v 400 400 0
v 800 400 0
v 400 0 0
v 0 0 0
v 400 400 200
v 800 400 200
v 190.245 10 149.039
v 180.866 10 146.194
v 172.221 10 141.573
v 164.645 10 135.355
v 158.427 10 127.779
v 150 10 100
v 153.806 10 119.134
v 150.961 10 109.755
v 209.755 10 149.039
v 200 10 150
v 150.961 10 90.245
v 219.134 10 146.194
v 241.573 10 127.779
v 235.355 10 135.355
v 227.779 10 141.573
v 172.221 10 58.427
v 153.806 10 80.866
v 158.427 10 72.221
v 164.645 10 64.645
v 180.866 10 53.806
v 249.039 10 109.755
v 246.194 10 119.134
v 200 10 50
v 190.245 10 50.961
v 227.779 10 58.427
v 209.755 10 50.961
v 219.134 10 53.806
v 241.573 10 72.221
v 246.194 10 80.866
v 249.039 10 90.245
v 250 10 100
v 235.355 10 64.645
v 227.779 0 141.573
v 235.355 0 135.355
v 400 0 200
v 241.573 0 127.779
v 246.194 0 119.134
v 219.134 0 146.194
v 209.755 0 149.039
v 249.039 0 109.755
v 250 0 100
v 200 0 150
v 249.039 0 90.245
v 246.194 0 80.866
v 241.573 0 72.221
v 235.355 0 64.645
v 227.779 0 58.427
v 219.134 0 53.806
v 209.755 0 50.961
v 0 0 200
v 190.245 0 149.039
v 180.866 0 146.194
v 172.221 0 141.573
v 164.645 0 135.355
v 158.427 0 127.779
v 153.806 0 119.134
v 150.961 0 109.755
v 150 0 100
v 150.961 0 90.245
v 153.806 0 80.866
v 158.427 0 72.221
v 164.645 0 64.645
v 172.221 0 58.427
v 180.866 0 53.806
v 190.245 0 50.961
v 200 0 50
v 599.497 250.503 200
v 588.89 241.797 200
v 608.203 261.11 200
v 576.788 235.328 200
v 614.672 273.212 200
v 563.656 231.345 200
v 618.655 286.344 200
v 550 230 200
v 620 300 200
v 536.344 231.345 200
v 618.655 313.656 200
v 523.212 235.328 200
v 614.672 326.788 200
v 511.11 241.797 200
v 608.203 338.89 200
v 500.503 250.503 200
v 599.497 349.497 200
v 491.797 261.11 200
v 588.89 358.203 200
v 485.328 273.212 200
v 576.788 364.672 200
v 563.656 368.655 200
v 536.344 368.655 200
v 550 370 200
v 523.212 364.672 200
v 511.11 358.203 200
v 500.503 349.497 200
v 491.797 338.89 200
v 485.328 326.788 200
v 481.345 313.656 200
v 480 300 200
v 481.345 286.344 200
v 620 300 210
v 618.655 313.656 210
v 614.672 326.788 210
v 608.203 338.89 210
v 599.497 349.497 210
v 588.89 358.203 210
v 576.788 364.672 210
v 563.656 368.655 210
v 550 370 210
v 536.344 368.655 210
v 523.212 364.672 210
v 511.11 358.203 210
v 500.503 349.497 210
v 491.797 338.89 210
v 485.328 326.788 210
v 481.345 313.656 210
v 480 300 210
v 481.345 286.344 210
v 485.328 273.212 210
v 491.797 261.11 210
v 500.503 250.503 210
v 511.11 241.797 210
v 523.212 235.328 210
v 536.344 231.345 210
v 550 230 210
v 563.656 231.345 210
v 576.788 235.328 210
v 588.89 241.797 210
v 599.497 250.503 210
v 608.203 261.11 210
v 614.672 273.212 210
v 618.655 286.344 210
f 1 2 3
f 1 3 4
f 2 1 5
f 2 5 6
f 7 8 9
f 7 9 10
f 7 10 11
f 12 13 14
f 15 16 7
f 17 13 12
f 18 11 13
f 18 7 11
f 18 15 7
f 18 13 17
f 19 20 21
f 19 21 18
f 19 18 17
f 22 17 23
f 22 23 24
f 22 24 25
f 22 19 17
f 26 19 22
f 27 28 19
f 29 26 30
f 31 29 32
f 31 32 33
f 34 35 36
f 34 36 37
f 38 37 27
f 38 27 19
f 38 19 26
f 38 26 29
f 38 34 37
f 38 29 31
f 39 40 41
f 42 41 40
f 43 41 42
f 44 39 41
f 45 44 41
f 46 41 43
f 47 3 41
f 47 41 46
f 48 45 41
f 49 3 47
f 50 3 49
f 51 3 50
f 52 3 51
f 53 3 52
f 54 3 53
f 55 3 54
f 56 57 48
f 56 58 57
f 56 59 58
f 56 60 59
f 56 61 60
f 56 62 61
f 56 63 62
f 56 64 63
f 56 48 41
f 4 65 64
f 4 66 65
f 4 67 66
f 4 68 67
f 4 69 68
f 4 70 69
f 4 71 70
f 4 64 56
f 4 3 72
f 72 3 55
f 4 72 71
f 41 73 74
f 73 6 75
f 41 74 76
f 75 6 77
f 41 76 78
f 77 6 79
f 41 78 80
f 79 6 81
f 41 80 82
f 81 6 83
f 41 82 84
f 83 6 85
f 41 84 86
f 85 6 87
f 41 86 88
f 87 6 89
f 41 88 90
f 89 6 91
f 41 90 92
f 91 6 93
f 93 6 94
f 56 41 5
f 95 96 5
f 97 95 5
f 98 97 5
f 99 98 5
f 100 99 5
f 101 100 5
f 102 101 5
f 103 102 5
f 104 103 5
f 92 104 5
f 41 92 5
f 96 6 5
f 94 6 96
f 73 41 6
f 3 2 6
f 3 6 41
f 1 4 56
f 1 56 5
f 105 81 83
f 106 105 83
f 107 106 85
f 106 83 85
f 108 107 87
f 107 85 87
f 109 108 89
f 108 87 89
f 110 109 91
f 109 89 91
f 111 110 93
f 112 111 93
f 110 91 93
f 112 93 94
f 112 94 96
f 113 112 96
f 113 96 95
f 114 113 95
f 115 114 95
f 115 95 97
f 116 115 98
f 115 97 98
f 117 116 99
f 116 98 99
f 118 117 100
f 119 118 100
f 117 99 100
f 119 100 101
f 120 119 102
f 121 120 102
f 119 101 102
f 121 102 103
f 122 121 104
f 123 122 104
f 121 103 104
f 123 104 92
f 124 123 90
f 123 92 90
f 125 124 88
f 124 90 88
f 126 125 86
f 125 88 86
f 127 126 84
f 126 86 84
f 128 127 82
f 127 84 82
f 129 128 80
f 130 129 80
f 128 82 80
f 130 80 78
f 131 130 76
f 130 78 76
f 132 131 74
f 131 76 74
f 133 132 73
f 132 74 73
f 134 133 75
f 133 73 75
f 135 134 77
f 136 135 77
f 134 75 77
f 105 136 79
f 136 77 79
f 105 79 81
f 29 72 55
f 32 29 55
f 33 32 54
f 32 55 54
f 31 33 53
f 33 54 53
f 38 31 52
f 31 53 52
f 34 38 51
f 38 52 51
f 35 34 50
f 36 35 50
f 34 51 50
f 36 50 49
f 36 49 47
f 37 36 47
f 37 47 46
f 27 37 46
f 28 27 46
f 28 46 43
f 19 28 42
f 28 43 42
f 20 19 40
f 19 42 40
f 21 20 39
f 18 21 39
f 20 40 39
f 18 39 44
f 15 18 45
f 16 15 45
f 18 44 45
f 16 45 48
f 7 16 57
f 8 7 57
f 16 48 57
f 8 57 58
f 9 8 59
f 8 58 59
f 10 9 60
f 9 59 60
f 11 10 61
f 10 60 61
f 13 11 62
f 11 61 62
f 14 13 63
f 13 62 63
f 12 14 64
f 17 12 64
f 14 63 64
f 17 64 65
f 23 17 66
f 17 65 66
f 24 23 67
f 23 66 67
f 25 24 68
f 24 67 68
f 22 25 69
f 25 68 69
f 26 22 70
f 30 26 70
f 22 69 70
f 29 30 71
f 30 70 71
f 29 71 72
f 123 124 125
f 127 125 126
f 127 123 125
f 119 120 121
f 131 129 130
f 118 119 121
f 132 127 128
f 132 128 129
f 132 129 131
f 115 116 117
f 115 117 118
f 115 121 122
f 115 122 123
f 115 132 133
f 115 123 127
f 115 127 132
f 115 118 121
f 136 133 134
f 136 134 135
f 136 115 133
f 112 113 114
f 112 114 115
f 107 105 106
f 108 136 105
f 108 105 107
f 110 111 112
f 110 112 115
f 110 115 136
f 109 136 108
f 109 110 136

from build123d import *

# Parameters (mm, degrees)
BOSS_EXTRU_1_DEPTH      = 200
ESQUISSE2_R             = 70
BOSS_EXTRU_2_DEPTH      = 10
ESQUISSE3_R             = 50
ENL_V_MAT_EXTRU_1_DEPTH = 10


with BuildPart() as part:
    # Esquisse1 → Boss.-Extru.1 (new body)
    with BuildSketch(Plane.XY):
        Polygon((0, 0), (400, 400), (800, 400), (400, 0), align=None)
    extrude(amount=BOSS_EXTRU_1_DEPTH)

    # Esquisse2 → Boss.-Extru.2 (add)
    with BuildSketch(Plane.XY.offset(200)):
        with Locations((550, 300)):
            Circle(ESQUISSE2_R)
    extrude(amount=BOSS_EXTRU_2_DEPTH)

    # Esquisse3 → Enlèv. mat.-Extru.1 (cut)
    with BuildSketch(Plane(origin=(0, 0, 0), x_dir=(-1, 0, 0), z_dir=(0, -1, 0))):
        with Locations(Location((-200, -100, 0), (0, 0, 90))):
            Circle(ESQUISSE3_R)
    extrude(amount=-ENL_V_MAT_EXTRU_1_DEPTH, mode=Mode.SUBTRACT)


solid = part.part
